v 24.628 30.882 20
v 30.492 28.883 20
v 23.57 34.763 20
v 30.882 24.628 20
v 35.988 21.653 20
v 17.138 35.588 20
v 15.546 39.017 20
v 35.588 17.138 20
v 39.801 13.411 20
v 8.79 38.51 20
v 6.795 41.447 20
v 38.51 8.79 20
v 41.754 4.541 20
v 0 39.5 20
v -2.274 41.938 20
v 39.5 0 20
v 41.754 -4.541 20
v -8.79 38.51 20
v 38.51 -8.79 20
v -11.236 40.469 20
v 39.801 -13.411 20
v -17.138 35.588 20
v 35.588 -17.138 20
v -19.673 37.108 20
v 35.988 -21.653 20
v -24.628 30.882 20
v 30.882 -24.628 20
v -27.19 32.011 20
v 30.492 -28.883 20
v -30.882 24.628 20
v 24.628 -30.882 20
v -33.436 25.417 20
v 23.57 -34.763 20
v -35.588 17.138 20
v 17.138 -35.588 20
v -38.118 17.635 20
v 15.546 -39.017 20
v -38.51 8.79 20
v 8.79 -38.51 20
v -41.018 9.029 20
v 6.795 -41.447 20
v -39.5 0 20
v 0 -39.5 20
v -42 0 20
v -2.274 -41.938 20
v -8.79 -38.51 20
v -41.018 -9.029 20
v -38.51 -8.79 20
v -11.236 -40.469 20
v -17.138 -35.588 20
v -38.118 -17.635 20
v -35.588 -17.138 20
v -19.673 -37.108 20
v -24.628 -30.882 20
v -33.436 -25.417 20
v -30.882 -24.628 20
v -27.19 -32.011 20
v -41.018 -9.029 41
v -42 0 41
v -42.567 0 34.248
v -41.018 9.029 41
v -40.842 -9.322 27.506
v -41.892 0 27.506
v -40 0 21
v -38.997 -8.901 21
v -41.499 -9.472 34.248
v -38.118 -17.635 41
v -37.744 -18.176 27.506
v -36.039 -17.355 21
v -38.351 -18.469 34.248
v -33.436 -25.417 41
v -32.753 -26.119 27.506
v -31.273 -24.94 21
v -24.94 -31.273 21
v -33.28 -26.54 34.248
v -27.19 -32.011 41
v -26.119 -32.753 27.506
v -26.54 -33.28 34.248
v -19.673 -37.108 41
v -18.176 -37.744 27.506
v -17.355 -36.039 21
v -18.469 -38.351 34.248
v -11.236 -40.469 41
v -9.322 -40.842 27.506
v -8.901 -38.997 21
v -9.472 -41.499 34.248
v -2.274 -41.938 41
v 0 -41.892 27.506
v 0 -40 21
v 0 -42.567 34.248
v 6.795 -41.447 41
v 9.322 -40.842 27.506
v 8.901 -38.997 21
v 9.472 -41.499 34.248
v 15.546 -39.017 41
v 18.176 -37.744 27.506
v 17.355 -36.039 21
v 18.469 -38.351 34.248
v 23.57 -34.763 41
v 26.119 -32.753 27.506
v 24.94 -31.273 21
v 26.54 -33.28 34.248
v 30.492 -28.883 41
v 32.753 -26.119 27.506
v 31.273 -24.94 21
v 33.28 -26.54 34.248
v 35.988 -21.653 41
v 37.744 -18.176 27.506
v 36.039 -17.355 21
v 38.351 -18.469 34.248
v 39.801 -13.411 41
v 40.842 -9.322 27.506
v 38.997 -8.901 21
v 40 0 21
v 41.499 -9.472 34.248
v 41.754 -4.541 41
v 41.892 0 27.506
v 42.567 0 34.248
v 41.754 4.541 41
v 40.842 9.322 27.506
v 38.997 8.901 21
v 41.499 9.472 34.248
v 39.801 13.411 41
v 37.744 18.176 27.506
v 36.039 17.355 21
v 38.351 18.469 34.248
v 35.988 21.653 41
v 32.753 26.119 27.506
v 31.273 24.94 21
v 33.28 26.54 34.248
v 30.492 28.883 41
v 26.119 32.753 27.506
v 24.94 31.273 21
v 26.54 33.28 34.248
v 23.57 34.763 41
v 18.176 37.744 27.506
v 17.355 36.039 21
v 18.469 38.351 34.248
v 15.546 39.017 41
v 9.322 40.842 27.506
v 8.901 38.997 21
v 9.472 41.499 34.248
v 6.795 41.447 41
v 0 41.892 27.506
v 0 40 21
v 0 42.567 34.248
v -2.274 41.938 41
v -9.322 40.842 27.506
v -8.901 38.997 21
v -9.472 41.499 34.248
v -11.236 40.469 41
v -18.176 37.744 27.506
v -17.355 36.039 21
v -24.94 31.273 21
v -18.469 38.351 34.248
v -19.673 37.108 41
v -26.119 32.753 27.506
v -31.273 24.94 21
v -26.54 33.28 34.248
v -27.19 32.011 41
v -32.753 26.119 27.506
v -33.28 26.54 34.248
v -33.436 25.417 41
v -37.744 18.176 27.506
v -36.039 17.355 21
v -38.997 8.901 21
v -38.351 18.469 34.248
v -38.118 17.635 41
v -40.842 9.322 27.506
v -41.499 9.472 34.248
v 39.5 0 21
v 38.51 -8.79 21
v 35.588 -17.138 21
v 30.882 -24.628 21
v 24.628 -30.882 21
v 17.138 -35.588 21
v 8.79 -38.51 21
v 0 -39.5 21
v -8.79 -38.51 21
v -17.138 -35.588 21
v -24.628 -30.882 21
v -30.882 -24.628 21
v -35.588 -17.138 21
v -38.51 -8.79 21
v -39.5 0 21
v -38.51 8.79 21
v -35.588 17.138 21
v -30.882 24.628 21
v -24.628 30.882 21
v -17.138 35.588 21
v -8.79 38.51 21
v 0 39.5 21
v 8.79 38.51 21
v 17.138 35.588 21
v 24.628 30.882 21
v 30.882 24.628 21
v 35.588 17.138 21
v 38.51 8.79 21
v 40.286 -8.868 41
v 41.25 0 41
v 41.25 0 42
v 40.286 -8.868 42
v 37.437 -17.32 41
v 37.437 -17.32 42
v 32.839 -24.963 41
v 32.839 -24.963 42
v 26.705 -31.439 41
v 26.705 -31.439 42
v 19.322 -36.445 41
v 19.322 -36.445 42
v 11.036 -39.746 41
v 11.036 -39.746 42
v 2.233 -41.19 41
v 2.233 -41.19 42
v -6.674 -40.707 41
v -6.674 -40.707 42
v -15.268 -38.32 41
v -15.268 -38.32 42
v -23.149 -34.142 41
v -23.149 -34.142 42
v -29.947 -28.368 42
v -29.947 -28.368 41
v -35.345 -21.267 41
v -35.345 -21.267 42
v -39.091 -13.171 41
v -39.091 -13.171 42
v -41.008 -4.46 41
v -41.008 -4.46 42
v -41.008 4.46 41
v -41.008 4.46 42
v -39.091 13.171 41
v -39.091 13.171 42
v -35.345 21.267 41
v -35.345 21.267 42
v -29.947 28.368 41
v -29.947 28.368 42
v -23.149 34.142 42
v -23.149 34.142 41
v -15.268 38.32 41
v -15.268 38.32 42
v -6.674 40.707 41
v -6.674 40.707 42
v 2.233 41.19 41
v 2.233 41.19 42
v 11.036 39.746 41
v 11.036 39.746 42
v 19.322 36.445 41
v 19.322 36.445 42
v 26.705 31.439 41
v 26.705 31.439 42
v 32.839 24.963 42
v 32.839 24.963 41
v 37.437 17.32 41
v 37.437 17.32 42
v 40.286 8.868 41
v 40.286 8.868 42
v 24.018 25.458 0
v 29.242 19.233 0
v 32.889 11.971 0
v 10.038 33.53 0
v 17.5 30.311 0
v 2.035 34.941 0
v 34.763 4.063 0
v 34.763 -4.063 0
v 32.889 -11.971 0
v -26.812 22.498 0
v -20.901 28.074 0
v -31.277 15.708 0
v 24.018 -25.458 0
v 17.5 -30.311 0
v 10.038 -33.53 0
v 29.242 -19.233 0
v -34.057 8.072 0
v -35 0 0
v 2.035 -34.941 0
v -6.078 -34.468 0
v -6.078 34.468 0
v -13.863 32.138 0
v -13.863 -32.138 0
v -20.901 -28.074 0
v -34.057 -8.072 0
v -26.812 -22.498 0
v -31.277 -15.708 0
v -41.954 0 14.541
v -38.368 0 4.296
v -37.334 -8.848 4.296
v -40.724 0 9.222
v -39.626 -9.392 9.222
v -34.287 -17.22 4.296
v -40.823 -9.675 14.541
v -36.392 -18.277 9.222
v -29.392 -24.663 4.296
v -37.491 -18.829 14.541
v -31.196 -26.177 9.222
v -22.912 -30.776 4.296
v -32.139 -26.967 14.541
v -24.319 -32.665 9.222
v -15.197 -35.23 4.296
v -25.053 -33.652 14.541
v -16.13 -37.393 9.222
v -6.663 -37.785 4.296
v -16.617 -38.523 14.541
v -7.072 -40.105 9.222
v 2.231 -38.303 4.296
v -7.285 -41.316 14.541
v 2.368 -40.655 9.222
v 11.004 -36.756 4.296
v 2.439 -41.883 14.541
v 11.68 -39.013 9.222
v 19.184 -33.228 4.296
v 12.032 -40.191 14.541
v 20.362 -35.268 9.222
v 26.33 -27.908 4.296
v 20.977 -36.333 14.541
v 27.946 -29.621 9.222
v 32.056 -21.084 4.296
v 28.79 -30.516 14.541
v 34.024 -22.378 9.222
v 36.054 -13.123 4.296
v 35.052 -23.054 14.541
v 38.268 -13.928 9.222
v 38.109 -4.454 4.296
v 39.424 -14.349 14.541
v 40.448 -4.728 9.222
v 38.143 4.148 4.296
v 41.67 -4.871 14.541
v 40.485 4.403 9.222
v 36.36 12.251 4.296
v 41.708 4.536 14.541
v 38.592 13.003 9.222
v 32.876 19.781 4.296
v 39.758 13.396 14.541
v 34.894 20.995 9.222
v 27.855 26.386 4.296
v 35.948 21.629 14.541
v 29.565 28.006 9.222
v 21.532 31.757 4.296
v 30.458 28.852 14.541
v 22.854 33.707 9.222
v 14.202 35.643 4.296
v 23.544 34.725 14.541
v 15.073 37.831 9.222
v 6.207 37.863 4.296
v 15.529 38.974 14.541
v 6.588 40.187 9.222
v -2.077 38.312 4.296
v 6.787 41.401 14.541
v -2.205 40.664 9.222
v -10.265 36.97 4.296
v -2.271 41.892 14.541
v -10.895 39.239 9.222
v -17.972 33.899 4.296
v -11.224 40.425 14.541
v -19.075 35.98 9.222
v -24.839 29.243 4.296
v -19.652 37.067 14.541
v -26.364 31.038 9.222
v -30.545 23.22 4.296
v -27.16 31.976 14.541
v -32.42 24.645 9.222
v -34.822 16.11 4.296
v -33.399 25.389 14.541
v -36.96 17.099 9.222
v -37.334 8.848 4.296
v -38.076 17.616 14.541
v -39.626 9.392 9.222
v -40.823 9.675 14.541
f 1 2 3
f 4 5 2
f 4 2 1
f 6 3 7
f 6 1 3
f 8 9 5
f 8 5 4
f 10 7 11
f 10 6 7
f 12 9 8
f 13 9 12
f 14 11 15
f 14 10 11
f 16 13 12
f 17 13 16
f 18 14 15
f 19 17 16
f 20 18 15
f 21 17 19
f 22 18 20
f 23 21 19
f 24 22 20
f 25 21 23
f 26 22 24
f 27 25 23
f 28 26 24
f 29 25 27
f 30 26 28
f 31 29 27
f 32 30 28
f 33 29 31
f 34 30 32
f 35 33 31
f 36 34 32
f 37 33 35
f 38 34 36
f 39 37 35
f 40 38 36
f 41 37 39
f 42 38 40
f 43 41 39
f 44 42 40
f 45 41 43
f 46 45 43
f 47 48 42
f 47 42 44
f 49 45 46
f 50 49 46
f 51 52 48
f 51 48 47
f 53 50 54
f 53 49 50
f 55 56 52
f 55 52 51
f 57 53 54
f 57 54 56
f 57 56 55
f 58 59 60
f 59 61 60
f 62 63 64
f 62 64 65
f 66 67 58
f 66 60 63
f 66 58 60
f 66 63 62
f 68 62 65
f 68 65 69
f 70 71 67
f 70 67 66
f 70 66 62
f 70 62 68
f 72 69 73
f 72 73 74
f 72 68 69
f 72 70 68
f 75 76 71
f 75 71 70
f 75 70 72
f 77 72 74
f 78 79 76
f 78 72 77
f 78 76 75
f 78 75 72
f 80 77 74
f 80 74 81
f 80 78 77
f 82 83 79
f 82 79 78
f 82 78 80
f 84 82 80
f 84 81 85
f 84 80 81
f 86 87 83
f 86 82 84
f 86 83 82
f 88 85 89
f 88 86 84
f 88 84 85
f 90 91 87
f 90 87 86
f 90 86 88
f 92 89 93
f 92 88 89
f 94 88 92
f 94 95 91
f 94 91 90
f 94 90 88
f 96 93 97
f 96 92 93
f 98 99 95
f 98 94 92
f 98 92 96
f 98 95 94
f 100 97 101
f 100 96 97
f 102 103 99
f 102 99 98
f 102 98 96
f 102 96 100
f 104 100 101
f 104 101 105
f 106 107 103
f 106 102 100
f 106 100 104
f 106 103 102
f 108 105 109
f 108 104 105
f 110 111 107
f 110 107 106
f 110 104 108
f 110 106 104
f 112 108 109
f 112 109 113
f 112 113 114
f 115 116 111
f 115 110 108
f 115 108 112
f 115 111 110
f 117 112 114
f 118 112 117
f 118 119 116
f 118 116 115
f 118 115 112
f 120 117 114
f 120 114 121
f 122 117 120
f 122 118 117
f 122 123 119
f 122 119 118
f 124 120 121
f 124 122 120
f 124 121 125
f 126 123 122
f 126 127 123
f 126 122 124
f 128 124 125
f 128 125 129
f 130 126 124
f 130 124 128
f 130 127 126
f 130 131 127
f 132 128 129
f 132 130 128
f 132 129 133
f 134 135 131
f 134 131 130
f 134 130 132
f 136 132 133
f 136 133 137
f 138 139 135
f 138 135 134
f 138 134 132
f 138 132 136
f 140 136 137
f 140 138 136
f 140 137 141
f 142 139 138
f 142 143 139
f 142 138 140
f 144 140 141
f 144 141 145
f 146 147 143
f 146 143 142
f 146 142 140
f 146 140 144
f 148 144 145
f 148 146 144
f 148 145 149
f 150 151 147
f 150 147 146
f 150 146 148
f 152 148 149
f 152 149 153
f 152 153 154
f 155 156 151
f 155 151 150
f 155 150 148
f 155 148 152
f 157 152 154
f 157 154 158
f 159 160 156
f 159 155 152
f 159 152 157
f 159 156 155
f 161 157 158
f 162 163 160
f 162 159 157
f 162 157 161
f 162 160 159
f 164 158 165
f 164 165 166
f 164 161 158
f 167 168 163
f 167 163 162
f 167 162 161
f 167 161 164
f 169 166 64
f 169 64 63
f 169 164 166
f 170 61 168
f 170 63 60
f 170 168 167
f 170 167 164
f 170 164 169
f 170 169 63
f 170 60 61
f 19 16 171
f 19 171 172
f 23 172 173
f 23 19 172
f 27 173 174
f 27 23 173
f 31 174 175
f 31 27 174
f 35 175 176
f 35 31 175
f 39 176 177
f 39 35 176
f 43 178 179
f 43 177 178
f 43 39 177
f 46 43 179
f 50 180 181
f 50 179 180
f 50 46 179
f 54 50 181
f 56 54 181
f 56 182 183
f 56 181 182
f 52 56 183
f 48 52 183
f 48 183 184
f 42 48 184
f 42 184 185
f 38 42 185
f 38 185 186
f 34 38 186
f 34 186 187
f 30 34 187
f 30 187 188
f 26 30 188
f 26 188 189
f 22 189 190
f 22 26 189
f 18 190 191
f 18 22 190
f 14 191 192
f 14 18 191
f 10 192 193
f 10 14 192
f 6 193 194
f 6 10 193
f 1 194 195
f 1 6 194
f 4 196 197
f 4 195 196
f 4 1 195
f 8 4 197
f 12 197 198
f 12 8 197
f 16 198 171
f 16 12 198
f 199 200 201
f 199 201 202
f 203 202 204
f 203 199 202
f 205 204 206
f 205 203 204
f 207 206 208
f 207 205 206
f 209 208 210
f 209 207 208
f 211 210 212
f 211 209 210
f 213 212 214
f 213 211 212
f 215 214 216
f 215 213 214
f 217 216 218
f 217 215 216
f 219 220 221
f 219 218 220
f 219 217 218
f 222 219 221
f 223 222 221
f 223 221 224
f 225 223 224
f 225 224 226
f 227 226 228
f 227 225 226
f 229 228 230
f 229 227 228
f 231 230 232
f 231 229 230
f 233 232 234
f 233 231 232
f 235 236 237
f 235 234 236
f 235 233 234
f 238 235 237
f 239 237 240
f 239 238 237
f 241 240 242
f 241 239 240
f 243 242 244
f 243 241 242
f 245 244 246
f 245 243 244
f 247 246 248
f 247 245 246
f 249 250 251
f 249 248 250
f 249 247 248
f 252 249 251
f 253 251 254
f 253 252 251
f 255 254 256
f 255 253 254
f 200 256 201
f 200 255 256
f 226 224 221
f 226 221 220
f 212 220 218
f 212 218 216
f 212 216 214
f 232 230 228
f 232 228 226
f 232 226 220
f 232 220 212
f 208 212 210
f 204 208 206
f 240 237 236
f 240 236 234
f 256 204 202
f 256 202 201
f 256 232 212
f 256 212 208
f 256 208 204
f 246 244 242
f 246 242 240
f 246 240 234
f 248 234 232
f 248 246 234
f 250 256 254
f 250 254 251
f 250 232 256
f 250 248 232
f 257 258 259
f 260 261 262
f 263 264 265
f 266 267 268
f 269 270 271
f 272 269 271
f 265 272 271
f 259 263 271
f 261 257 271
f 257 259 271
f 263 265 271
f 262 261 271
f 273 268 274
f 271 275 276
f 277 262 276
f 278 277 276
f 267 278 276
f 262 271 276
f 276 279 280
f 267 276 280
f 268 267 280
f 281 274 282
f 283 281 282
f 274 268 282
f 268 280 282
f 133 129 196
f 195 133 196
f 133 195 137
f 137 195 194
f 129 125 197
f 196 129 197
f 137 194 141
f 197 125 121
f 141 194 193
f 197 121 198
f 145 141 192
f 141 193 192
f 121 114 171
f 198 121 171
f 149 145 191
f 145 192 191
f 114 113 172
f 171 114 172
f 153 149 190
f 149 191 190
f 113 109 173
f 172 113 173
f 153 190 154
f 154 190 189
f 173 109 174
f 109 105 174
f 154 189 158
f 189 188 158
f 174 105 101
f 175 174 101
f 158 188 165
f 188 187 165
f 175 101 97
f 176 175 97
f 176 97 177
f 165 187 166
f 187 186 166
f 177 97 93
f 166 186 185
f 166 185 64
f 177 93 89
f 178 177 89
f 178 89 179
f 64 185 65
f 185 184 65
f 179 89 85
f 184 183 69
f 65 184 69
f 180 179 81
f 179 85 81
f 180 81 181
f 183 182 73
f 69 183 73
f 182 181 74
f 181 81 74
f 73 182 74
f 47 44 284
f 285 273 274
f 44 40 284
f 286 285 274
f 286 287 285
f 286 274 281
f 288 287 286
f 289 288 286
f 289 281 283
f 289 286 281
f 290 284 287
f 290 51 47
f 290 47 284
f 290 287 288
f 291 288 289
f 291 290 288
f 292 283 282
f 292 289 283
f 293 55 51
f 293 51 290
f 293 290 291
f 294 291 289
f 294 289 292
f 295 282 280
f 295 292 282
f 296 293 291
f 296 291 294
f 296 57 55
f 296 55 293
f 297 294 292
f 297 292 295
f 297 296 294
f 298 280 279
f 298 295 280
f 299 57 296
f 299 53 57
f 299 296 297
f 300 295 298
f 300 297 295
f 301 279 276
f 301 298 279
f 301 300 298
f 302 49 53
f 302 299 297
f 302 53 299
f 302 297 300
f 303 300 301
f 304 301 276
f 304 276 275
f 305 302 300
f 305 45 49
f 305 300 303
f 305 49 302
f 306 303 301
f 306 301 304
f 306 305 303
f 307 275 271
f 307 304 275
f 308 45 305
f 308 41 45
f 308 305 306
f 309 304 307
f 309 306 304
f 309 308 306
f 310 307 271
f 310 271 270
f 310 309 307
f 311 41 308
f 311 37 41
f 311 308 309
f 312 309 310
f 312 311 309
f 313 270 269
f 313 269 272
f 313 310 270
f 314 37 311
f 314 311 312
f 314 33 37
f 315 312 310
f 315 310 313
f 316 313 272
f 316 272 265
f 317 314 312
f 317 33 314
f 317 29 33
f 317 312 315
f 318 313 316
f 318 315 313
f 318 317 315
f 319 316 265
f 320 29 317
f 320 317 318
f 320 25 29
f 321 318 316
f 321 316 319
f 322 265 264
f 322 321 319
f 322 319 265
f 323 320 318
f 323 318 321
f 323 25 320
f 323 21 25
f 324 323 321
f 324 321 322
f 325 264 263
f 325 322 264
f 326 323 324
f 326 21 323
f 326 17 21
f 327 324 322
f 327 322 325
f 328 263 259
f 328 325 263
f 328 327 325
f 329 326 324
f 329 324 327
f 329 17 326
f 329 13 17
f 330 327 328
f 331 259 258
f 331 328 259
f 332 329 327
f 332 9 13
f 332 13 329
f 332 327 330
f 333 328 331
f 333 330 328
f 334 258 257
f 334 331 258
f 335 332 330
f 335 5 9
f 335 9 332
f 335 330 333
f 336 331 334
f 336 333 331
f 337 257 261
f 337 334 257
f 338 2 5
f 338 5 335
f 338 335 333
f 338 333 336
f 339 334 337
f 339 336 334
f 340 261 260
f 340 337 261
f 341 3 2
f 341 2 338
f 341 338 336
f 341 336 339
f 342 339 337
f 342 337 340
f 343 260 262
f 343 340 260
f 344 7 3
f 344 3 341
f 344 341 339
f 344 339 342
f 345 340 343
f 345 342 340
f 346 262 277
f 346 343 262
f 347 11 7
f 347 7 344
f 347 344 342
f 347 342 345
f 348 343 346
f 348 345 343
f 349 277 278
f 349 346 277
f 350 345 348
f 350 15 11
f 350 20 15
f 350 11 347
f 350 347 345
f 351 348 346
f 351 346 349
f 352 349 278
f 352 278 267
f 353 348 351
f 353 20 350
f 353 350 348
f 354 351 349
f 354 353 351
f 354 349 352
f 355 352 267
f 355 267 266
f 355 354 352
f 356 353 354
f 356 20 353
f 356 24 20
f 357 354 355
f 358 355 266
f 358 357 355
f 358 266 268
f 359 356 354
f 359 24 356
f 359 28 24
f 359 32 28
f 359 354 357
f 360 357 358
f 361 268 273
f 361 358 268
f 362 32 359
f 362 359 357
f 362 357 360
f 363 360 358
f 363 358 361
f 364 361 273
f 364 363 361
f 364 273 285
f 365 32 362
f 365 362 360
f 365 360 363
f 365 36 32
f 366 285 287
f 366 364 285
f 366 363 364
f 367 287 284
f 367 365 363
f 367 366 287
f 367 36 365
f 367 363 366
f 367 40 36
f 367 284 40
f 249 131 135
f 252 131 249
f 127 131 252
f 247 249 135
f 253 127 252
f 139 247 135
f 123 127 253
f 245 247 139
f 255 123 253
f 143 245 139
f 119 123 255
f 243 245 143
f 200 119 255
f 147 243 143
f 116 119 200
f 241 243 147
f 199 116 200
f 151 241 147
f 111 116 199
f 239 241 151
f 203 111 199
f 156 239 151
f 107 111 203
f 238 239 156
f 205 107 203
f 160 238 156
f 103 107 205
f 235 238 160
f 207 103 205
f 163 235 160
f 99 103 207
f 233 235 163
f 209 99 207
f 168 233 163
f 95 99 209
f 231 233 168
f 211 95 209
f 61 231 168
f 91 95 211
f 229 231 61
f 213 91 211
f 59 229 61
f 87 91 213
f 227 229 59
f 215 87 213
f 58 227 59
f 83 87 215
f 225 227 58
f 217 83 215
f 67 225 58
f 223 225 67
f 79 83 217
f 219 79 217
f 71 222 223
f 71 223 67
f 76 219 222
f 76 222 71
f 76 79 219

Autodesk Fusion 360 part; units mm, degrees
sketch "Sketch1" plane through (0, 0, 0) normal (0, 1, 0) x (1, 0, 0)
  line L0 (0, 0) -> (-35, 0)
  line L1 (0, 0) -> (0, -20)
  line L2 (0, -20) -> (-42, -20)
  arc A0 (-35, 0) -> (-42, -20) centre (-17.1273, -17.4804) ccw
  dimension "d1" = 35
  dimension "d2" = 20
  dimension "d3" = 42
  dimension "d4" = 25
revolve "Revolve1" add sketch "Sketch1" angle 360 about axis through (0, 0, 0) along (0, 0, 1)
sketch "Sketch2" plane through (0, 0, 20) normal (0, 0, 1) x (1, 0, 0)
  circle A0 centre (0, 0) radius 42
  circle A1 centre (0, 0) radius 39.5
  dimension "d6" = 79
extrude "Extrude1" add sketch "Sketch2" along normal blind 1 contours A1
sketch "Sketch4" plane through (0, 0, 21) normal (0, 0, 1) x (1, 0, 0)
  circle A0 centre (0, 0) radius 39.5
sketch "Sketch5" plane through (0, 0, 0) normal (0, 1, 0) x (1, 0, 0)
  line L0 (0, -21) -> (0, -41)
  line L1 (0, -41) -> (-42, -41)
  line L2 (0, -21) -> (-40, -21)
  arc A0 (-40, -21) -> (-42, -41) centre (-5.5677, -34.5432) ccw
  point P0 (0, -21)
  dimension "d9" = 20
  dimension "d10" = 42
  dimension "d11" = 40
  dimension "d12" = 37
revolve "Revolve2" add sketch "Sketch5" angle 360 about axis through (0, 0, 1.75) along (0, 0, 1)
sketch "Sketch6" plane through (0, 0, 41) normal (0, 0, 1) x (1, 0, 0)
  circle A0 centre (0, 0) radius 42
  circle A1 centre (0, 0) radius 41.25
  dimension "d14" = 82.5
extrude "Extrude2" add sketch "Sketch6" along normal blind 1 contours A1
